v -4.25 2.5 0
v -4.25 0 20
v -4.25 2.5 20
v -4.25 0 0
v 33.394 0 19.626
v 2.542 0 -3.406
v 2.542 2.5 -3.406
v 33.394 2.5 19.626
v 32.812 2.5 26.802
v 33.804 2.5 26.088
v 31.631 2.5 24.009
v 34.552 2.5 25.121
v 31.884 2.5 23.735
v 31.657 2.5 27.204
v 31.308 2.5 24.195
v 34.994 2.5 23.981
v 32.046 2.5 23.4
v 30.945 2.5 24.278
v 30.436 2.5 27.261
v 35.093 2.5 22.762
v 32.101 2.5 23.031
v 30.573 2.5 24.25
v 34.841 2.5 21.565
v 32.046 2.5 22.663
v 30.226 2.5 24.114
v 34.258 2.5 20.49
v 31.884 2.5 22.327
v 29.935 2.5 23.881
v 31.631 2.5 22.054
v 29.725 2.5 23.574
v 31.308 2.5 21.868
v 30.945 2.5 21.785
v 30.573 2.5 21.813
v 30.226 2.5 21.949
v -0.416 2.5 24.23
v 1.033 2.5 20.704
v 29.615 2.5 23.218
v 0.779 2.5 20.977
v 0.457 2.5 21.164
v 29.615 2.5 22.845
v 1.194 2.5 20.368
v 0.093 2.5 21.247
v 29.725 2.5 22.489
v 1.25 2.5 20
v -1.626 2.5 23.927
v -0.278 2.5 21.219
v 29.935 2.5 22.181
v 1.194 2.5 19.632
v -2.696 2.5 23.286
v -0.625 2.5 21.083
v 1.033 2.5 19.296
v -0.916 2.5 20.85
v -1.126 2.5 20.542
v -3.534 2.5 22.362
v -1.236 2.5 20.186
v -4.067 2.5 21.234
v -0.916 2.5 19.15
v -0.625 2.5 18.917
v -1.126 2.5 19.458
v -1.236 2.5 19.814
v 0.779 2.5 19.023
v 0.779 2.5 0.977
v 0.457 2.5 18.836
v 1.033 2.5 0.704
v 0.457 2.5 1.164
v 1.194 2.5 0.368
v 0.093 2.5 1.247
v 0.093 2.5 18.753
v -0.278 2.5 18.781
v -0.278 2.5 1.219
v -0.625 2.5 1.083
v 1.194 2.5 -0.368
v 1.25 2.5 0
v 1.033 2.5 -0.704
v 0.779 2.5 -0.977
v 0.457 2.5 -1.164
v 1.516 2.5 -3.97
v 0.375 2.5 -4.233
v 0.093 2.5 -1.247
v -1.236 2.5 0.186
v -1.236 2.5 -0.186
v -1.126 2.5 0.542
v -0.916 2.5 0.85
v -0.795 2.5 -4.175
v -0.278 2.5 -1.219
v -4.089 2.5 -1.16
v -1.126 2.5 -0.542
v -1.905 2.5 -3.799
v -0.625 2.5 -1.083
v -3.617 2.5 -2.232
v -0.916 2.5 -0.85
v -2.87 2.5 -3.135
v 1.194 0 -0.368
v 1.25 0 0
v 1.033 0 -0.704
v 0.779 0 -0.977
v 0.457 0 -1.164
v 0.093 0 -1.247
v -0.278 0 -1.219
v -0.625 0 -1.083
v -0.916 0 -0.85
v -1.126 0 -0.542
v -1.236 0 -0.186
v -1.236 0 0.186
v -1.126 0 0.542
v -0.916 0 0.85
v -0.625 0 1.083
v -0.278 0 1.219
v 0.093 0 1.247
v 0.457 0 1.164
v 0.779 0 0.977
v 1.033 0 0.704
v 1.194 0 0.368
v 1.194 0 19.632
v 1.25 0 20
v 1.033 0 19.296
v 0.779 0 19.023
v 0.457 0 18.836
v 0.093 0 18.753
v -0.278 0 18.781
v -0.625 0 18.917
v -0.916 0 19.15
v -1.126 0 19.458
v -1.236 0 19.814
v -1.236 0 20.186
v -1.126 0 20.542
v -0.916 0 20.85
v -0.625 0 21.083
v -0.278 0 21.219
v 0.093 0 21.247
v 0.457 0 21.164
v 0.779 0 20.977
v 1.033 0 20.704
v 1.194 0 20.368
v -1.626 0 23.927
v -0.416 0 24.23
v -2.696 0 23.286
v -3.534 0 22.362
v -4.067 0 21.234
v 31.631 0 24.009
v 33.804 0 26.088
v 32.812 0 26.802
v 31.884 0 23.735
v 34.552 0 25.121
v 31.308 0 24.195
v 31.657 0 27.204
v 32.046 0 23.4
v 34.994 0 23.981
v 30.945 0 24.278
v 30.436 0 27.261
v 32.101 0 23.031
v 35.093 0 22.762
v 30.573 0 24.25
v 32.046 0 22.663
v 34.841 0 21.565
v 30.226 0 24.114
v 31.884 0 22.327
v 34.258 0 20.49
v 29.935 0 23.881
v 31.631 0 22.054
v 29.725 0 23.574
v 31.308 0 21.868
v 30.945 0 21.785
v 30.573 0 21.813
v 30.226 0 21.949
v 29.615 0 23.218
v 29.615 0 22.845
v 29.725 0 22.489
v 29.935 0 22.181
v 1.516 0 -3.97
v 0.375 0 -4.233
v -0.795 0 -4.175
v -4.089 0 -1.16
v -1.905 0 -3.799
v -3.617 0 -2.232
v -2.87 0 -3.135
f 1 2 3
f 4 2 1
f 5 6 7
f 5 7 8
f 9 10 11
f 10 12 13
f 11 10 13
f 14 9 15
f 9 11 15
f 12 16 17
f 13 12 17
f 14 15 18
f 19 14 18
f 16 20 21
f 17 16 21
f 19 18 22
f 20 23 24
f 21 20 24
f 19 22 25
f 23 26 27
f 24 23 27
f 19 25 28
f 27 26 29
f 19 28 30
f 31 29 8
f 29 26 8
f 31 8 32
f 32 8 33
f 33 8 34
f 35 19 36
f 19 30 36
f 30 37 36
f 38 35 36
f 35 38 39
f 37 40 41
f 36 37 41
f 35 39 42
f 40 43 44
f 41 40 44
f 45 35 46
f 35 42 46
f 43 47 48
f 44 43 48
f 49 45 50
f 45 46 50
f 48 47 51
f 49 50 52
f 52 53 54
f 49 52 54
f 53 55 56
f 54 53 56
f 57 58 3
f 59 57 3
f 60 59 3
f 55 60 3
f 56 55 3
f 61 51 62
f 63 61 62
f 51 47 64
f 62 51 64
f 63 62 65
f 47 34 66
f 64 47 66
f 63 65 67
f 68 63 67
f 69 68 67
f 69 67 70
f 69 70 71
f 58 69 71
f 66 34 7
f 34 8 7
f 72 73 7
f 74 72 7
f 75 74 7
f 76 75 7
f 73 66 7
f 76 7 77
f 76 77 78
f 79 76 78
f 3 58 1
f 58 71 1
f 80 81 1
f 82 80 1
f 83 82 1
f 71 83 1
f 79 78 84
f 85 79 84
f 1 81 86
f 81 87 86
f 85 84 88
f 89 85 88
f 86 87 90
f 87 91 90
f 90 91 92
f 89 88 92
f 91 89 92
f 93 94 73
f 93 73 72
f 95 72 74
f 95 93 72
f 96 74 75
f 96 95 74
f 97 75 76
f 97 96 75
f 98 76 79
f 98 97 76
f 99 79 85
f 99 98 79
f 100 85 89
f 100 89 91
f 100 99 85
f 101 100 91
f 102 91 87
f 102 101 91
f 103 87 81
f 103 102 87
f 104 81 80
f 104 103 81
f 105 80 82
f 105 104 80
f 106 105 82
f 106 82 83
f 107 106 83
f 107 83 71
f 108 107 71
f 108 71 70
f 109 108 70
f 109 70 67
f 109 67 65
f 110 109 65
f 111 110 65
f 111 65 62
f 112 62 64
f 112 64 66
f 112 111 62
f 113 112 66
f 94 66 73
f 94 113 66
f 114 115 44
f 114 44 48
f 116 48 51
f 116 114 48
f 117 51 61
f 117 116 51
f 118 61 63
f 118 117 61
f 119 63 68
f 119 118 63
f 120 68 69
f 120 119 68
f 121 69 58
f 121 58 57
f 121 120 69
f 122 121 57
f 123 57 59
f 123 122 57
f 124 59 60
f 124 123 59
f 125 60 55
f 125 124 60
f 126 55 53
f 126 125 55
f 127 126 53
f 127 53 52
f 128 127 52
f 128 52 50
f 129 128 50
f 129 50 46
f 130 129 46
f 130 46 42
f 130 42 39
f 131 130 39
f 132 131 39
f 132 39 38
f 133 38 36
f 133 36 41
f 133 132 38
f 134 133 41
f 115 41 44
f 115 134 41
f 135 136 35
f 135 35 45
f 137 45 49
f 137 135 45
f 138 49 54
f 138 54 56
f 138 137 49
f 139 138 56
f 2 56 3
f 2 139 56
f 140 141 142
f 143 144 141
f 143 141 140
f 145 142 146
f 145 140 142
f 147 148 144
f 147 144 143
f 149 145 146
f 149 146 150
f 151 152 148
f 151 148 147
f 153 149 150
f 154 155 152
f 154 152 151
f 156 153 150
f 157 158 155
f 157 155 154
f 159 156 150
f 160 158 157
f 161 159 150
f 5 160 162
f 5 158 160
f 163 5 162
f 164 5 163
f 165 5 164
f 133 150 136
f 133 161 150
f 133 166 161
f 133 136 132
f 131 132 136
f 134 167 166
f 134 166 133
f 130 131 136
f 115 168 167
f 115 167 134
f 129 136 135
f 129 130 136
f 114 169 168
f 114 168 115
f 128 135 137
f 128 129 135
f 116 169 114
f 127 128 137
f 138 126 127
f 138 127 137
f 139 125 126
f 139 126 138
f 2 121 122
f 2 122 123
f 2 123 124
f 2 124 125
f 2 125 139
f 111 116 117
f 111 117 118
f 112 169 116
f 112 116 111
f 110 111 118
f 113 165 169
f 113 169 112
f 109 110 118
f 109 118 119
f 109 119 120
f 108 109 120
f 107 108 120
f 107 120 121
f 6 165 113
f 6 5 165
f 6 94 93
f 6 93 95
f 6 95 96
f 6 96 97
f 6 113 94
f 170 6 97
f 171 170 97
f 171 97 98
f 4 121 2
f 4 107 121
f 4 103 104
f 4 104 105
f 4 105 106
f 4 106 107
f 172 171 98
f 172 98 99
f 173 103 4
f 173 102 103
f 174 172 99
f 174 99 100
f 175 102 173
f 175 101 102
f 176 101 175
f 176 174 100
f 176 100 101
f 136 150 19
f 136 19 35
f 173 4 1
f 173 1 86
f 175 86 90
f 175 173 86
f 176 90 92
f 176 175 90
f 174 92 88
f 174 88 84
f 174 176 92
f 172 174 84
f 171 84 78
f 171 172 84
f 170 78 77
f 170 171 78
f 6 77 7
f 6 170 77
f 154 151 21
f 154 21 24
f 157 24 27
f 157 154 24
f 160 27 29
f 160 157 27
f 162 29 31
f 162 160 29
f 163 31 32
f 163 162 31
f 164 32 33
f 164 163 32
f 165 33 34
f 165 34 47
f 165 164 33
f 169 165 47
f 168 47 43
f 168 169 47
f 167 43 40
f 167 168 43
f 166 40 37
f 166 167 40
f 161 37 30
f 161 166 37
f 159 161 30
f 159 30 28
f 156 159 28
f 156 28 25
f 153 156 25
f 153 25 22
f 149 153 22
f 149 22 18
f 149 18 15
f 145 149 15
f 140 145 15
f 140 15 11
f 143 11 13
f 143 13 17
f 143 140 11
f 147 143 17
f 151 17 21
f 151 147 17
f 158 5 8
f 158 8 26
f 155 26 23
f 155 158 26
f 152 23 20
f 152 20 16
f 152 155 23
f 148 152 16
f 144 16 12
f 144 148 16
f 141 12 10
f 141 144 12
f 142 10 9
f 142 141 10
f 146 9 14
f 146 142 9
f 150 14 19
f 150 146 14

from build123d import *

# Parameters (mm, degrees)
SKETCH1_R           = 1.25
BOSS_EXTRUDE1_DEPTH = 2.5


with BuildPart() as part:
    # Sketch1 → Boss-Extrude1 (new body)
    with BuildSketch(Plane(origin=(0, 0, 0), x_dir=(1, 0, 0), z_dir=(0, 1, 0))):
        with BuildLine():
            Line((2.542410714, 3.405678752), (33.393853524, -19.625571248))
            ThreePointArc((33.393853524, -19.625571248), (34.814441101, -24.566549497), (30.435868213, -27.260883288))
            Line((30.435868213, -27.260883288), (-0.415574597, -24.229633288))
            ThreePointArc((-0.415574597, -24.229633288), (-3.148705451, -22.85449715), (-4.25, -20))
            Line((-4.25, -20), (-4.25, 0))
            ThreePointArc((-4.25, 0), (-1.904895596, 3.7991937), (2.542410714, 3.405678752))
        make_face()
        Circle(SKETCH1_R, mode=Mode.SUBTRACT)
        with Locations((0, -20)):
            Circle(SKETCH1_R, mode=Mode.SUBTRACT)
        with Locations((30.85144281, -23.03125)):
            Circle(SKETCH1_R, mode=Mode.SUBTRACT)
    extrude(amount=BOSS_EXTRUDE1_DEPTH)


solid = part.part
